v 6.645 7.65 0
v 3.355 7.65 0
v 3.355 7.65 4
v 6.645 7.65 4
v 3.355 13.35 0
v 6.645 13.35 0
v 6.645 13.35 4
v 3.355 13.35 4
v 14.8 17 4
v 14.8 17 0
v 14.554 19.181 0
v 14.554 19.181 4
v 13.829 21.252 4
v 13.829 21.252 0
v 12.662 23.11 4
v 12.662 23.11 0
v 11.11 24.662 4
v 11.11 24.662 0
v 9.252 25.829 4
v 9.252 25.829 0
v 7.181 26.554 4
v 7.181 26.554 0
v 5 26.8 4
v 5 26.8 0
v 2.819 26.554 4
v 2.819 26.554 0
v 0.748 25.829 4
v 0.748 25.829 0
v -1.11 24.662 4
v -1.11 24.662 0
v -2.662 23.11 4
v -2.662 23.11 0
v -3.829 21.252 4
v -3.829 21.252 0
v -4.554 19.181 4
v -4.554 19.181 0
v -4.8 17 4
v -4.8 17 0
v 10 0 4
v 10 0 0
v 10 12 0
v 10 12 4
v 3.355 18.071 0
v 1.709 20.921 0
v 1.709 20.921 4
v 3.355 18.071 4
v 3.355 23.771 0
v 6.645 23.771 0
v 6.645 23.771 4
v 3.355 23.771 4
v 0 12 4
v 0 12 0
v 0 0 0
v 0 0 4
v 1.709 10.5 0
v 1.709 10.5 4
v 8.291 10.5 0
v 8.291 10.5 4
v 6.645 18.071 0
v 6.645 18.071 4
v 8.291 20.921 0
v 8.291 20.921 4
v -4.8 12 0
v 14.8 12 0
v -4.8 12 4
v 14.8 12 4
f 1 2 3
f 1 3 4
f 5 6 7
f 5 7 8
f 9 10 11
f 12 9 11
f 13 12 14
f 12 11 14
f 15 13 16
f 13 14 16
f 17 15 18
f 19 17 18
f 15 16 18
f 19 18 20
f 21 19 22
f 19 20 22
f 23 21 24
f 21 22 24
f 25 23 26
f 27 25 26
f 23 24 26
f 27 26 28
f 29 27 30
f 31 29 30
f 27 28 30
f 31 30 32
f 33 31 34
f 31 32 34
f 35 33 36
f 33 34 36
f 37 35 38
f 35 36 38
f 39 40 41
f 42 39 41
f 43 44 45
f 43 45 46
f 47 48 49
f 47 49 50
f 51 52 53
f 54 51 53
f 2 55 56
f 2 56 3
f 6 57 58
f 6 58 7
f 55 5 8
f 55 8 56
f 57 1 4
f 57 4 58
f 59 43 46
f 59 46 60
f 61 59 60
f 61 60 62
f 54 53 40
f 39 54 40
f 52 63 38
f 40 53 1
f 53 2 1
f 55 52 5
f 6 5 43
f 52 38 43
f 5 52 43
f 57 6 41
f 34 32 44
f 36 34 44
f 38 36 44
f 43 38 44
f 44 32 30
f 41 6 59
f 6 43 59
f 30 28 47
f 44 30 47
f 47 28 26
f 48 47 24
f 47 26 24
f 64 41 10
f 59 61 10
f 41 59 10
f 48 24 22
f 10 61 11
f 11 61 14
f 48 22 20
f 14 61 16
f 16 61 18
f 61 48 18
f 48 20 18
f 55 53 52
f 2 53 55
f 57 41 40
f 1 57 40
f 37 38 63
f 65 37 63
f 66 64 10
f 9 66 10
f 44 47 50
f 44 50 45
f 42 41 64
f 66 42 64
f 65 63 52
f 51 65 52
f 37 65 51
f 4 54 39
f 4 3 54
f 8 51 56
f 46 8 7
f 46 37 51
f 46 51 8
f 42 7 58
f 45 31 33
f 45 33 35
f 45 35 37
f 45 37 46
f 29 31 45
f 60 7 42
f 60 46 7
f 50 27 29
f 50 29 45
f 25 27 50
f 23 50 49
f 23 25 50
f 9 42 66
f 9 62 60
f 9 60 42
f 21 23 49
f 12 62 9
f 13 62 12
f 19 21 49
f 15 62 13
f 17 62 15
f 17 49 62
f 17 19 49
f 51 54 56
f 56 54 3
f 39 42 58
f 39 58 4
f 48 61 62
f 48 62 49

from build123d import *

# Parameters (mm, degrees)
BOSS_EXTRUDE1_DEPTH = 4
SKETCH2_W           = 2.5
SKETCH2_H           = 4
CUT_EXTRUDE1_DEPTH  = 4


with BuildPart() as part:
    # Sketch1 → Boss-Extrude1 (new body)
    with BuildSketch(Plane.XY):
        with BuildLine():
            Line((0, 0), (10, 0))
            Line((10, 0), (10, 4))
            Line((10, 4), (12.5, 4))
            Line((12.5, 4), (12.5, 8))
            Line((12.5, 8), (10, 8))
            Line((10, 8), (10, 12))
            Line((10, 12), (14.8, 12))
            Line((14.8, 12), (14.8, 17))
            ThreePointArc((14.8, 17), (5, 26.8), (-4.8, 17))
            Line((-4.8, 17), (-4.8, 12))
            Line((-4.8, 12), (0, 12))
            Line((0, 12), (0, 8))
            Line((0, 8), (-2.5, 8))
            Line((-2.5, 8), (-2.5, 4))
            Line((-2.5, 4), (0, 4))
            Line((0, 4), (0, 0))
        make_face()
        Polygon((3.354551733, 18.071172359), (6.645448267, 18.071172359), (8.290896534, 20.921172359), (6.645448267, 23.771172359), (3.354551733, 23.771172359), (1.709103466, 20.921172359), align=None, mode=Mode.SUBTRACT)
        Polygon((8.290896534, 10.5), (6.645448267, 13.35), (3.354551733, 13.35), (1.709103466, 10.5), (3.354551733, 7.65), (6.645448267, 7.65), align=None, mode=Mode.SUBTRACT)
    extrude(amount=BOSS_EXTRUDE1_DEPTH)

    # Sketch2 → Cut-Extrude1 (cut)
    with BuildSketch(Plane.XY.offset(4)):
        with Locations((-1.25, 6)):
            Rectangle(SKETCH2_W, SKETCH2_H)
        with Locations((11.25, 6)):
            Rectangle(SKETCH2_W, SKETCH2_H)
    extrude(amount=-CUT_EXTRUDE1_DEPTH, mode=Mode.SUBTRACT)


solid = part.part
